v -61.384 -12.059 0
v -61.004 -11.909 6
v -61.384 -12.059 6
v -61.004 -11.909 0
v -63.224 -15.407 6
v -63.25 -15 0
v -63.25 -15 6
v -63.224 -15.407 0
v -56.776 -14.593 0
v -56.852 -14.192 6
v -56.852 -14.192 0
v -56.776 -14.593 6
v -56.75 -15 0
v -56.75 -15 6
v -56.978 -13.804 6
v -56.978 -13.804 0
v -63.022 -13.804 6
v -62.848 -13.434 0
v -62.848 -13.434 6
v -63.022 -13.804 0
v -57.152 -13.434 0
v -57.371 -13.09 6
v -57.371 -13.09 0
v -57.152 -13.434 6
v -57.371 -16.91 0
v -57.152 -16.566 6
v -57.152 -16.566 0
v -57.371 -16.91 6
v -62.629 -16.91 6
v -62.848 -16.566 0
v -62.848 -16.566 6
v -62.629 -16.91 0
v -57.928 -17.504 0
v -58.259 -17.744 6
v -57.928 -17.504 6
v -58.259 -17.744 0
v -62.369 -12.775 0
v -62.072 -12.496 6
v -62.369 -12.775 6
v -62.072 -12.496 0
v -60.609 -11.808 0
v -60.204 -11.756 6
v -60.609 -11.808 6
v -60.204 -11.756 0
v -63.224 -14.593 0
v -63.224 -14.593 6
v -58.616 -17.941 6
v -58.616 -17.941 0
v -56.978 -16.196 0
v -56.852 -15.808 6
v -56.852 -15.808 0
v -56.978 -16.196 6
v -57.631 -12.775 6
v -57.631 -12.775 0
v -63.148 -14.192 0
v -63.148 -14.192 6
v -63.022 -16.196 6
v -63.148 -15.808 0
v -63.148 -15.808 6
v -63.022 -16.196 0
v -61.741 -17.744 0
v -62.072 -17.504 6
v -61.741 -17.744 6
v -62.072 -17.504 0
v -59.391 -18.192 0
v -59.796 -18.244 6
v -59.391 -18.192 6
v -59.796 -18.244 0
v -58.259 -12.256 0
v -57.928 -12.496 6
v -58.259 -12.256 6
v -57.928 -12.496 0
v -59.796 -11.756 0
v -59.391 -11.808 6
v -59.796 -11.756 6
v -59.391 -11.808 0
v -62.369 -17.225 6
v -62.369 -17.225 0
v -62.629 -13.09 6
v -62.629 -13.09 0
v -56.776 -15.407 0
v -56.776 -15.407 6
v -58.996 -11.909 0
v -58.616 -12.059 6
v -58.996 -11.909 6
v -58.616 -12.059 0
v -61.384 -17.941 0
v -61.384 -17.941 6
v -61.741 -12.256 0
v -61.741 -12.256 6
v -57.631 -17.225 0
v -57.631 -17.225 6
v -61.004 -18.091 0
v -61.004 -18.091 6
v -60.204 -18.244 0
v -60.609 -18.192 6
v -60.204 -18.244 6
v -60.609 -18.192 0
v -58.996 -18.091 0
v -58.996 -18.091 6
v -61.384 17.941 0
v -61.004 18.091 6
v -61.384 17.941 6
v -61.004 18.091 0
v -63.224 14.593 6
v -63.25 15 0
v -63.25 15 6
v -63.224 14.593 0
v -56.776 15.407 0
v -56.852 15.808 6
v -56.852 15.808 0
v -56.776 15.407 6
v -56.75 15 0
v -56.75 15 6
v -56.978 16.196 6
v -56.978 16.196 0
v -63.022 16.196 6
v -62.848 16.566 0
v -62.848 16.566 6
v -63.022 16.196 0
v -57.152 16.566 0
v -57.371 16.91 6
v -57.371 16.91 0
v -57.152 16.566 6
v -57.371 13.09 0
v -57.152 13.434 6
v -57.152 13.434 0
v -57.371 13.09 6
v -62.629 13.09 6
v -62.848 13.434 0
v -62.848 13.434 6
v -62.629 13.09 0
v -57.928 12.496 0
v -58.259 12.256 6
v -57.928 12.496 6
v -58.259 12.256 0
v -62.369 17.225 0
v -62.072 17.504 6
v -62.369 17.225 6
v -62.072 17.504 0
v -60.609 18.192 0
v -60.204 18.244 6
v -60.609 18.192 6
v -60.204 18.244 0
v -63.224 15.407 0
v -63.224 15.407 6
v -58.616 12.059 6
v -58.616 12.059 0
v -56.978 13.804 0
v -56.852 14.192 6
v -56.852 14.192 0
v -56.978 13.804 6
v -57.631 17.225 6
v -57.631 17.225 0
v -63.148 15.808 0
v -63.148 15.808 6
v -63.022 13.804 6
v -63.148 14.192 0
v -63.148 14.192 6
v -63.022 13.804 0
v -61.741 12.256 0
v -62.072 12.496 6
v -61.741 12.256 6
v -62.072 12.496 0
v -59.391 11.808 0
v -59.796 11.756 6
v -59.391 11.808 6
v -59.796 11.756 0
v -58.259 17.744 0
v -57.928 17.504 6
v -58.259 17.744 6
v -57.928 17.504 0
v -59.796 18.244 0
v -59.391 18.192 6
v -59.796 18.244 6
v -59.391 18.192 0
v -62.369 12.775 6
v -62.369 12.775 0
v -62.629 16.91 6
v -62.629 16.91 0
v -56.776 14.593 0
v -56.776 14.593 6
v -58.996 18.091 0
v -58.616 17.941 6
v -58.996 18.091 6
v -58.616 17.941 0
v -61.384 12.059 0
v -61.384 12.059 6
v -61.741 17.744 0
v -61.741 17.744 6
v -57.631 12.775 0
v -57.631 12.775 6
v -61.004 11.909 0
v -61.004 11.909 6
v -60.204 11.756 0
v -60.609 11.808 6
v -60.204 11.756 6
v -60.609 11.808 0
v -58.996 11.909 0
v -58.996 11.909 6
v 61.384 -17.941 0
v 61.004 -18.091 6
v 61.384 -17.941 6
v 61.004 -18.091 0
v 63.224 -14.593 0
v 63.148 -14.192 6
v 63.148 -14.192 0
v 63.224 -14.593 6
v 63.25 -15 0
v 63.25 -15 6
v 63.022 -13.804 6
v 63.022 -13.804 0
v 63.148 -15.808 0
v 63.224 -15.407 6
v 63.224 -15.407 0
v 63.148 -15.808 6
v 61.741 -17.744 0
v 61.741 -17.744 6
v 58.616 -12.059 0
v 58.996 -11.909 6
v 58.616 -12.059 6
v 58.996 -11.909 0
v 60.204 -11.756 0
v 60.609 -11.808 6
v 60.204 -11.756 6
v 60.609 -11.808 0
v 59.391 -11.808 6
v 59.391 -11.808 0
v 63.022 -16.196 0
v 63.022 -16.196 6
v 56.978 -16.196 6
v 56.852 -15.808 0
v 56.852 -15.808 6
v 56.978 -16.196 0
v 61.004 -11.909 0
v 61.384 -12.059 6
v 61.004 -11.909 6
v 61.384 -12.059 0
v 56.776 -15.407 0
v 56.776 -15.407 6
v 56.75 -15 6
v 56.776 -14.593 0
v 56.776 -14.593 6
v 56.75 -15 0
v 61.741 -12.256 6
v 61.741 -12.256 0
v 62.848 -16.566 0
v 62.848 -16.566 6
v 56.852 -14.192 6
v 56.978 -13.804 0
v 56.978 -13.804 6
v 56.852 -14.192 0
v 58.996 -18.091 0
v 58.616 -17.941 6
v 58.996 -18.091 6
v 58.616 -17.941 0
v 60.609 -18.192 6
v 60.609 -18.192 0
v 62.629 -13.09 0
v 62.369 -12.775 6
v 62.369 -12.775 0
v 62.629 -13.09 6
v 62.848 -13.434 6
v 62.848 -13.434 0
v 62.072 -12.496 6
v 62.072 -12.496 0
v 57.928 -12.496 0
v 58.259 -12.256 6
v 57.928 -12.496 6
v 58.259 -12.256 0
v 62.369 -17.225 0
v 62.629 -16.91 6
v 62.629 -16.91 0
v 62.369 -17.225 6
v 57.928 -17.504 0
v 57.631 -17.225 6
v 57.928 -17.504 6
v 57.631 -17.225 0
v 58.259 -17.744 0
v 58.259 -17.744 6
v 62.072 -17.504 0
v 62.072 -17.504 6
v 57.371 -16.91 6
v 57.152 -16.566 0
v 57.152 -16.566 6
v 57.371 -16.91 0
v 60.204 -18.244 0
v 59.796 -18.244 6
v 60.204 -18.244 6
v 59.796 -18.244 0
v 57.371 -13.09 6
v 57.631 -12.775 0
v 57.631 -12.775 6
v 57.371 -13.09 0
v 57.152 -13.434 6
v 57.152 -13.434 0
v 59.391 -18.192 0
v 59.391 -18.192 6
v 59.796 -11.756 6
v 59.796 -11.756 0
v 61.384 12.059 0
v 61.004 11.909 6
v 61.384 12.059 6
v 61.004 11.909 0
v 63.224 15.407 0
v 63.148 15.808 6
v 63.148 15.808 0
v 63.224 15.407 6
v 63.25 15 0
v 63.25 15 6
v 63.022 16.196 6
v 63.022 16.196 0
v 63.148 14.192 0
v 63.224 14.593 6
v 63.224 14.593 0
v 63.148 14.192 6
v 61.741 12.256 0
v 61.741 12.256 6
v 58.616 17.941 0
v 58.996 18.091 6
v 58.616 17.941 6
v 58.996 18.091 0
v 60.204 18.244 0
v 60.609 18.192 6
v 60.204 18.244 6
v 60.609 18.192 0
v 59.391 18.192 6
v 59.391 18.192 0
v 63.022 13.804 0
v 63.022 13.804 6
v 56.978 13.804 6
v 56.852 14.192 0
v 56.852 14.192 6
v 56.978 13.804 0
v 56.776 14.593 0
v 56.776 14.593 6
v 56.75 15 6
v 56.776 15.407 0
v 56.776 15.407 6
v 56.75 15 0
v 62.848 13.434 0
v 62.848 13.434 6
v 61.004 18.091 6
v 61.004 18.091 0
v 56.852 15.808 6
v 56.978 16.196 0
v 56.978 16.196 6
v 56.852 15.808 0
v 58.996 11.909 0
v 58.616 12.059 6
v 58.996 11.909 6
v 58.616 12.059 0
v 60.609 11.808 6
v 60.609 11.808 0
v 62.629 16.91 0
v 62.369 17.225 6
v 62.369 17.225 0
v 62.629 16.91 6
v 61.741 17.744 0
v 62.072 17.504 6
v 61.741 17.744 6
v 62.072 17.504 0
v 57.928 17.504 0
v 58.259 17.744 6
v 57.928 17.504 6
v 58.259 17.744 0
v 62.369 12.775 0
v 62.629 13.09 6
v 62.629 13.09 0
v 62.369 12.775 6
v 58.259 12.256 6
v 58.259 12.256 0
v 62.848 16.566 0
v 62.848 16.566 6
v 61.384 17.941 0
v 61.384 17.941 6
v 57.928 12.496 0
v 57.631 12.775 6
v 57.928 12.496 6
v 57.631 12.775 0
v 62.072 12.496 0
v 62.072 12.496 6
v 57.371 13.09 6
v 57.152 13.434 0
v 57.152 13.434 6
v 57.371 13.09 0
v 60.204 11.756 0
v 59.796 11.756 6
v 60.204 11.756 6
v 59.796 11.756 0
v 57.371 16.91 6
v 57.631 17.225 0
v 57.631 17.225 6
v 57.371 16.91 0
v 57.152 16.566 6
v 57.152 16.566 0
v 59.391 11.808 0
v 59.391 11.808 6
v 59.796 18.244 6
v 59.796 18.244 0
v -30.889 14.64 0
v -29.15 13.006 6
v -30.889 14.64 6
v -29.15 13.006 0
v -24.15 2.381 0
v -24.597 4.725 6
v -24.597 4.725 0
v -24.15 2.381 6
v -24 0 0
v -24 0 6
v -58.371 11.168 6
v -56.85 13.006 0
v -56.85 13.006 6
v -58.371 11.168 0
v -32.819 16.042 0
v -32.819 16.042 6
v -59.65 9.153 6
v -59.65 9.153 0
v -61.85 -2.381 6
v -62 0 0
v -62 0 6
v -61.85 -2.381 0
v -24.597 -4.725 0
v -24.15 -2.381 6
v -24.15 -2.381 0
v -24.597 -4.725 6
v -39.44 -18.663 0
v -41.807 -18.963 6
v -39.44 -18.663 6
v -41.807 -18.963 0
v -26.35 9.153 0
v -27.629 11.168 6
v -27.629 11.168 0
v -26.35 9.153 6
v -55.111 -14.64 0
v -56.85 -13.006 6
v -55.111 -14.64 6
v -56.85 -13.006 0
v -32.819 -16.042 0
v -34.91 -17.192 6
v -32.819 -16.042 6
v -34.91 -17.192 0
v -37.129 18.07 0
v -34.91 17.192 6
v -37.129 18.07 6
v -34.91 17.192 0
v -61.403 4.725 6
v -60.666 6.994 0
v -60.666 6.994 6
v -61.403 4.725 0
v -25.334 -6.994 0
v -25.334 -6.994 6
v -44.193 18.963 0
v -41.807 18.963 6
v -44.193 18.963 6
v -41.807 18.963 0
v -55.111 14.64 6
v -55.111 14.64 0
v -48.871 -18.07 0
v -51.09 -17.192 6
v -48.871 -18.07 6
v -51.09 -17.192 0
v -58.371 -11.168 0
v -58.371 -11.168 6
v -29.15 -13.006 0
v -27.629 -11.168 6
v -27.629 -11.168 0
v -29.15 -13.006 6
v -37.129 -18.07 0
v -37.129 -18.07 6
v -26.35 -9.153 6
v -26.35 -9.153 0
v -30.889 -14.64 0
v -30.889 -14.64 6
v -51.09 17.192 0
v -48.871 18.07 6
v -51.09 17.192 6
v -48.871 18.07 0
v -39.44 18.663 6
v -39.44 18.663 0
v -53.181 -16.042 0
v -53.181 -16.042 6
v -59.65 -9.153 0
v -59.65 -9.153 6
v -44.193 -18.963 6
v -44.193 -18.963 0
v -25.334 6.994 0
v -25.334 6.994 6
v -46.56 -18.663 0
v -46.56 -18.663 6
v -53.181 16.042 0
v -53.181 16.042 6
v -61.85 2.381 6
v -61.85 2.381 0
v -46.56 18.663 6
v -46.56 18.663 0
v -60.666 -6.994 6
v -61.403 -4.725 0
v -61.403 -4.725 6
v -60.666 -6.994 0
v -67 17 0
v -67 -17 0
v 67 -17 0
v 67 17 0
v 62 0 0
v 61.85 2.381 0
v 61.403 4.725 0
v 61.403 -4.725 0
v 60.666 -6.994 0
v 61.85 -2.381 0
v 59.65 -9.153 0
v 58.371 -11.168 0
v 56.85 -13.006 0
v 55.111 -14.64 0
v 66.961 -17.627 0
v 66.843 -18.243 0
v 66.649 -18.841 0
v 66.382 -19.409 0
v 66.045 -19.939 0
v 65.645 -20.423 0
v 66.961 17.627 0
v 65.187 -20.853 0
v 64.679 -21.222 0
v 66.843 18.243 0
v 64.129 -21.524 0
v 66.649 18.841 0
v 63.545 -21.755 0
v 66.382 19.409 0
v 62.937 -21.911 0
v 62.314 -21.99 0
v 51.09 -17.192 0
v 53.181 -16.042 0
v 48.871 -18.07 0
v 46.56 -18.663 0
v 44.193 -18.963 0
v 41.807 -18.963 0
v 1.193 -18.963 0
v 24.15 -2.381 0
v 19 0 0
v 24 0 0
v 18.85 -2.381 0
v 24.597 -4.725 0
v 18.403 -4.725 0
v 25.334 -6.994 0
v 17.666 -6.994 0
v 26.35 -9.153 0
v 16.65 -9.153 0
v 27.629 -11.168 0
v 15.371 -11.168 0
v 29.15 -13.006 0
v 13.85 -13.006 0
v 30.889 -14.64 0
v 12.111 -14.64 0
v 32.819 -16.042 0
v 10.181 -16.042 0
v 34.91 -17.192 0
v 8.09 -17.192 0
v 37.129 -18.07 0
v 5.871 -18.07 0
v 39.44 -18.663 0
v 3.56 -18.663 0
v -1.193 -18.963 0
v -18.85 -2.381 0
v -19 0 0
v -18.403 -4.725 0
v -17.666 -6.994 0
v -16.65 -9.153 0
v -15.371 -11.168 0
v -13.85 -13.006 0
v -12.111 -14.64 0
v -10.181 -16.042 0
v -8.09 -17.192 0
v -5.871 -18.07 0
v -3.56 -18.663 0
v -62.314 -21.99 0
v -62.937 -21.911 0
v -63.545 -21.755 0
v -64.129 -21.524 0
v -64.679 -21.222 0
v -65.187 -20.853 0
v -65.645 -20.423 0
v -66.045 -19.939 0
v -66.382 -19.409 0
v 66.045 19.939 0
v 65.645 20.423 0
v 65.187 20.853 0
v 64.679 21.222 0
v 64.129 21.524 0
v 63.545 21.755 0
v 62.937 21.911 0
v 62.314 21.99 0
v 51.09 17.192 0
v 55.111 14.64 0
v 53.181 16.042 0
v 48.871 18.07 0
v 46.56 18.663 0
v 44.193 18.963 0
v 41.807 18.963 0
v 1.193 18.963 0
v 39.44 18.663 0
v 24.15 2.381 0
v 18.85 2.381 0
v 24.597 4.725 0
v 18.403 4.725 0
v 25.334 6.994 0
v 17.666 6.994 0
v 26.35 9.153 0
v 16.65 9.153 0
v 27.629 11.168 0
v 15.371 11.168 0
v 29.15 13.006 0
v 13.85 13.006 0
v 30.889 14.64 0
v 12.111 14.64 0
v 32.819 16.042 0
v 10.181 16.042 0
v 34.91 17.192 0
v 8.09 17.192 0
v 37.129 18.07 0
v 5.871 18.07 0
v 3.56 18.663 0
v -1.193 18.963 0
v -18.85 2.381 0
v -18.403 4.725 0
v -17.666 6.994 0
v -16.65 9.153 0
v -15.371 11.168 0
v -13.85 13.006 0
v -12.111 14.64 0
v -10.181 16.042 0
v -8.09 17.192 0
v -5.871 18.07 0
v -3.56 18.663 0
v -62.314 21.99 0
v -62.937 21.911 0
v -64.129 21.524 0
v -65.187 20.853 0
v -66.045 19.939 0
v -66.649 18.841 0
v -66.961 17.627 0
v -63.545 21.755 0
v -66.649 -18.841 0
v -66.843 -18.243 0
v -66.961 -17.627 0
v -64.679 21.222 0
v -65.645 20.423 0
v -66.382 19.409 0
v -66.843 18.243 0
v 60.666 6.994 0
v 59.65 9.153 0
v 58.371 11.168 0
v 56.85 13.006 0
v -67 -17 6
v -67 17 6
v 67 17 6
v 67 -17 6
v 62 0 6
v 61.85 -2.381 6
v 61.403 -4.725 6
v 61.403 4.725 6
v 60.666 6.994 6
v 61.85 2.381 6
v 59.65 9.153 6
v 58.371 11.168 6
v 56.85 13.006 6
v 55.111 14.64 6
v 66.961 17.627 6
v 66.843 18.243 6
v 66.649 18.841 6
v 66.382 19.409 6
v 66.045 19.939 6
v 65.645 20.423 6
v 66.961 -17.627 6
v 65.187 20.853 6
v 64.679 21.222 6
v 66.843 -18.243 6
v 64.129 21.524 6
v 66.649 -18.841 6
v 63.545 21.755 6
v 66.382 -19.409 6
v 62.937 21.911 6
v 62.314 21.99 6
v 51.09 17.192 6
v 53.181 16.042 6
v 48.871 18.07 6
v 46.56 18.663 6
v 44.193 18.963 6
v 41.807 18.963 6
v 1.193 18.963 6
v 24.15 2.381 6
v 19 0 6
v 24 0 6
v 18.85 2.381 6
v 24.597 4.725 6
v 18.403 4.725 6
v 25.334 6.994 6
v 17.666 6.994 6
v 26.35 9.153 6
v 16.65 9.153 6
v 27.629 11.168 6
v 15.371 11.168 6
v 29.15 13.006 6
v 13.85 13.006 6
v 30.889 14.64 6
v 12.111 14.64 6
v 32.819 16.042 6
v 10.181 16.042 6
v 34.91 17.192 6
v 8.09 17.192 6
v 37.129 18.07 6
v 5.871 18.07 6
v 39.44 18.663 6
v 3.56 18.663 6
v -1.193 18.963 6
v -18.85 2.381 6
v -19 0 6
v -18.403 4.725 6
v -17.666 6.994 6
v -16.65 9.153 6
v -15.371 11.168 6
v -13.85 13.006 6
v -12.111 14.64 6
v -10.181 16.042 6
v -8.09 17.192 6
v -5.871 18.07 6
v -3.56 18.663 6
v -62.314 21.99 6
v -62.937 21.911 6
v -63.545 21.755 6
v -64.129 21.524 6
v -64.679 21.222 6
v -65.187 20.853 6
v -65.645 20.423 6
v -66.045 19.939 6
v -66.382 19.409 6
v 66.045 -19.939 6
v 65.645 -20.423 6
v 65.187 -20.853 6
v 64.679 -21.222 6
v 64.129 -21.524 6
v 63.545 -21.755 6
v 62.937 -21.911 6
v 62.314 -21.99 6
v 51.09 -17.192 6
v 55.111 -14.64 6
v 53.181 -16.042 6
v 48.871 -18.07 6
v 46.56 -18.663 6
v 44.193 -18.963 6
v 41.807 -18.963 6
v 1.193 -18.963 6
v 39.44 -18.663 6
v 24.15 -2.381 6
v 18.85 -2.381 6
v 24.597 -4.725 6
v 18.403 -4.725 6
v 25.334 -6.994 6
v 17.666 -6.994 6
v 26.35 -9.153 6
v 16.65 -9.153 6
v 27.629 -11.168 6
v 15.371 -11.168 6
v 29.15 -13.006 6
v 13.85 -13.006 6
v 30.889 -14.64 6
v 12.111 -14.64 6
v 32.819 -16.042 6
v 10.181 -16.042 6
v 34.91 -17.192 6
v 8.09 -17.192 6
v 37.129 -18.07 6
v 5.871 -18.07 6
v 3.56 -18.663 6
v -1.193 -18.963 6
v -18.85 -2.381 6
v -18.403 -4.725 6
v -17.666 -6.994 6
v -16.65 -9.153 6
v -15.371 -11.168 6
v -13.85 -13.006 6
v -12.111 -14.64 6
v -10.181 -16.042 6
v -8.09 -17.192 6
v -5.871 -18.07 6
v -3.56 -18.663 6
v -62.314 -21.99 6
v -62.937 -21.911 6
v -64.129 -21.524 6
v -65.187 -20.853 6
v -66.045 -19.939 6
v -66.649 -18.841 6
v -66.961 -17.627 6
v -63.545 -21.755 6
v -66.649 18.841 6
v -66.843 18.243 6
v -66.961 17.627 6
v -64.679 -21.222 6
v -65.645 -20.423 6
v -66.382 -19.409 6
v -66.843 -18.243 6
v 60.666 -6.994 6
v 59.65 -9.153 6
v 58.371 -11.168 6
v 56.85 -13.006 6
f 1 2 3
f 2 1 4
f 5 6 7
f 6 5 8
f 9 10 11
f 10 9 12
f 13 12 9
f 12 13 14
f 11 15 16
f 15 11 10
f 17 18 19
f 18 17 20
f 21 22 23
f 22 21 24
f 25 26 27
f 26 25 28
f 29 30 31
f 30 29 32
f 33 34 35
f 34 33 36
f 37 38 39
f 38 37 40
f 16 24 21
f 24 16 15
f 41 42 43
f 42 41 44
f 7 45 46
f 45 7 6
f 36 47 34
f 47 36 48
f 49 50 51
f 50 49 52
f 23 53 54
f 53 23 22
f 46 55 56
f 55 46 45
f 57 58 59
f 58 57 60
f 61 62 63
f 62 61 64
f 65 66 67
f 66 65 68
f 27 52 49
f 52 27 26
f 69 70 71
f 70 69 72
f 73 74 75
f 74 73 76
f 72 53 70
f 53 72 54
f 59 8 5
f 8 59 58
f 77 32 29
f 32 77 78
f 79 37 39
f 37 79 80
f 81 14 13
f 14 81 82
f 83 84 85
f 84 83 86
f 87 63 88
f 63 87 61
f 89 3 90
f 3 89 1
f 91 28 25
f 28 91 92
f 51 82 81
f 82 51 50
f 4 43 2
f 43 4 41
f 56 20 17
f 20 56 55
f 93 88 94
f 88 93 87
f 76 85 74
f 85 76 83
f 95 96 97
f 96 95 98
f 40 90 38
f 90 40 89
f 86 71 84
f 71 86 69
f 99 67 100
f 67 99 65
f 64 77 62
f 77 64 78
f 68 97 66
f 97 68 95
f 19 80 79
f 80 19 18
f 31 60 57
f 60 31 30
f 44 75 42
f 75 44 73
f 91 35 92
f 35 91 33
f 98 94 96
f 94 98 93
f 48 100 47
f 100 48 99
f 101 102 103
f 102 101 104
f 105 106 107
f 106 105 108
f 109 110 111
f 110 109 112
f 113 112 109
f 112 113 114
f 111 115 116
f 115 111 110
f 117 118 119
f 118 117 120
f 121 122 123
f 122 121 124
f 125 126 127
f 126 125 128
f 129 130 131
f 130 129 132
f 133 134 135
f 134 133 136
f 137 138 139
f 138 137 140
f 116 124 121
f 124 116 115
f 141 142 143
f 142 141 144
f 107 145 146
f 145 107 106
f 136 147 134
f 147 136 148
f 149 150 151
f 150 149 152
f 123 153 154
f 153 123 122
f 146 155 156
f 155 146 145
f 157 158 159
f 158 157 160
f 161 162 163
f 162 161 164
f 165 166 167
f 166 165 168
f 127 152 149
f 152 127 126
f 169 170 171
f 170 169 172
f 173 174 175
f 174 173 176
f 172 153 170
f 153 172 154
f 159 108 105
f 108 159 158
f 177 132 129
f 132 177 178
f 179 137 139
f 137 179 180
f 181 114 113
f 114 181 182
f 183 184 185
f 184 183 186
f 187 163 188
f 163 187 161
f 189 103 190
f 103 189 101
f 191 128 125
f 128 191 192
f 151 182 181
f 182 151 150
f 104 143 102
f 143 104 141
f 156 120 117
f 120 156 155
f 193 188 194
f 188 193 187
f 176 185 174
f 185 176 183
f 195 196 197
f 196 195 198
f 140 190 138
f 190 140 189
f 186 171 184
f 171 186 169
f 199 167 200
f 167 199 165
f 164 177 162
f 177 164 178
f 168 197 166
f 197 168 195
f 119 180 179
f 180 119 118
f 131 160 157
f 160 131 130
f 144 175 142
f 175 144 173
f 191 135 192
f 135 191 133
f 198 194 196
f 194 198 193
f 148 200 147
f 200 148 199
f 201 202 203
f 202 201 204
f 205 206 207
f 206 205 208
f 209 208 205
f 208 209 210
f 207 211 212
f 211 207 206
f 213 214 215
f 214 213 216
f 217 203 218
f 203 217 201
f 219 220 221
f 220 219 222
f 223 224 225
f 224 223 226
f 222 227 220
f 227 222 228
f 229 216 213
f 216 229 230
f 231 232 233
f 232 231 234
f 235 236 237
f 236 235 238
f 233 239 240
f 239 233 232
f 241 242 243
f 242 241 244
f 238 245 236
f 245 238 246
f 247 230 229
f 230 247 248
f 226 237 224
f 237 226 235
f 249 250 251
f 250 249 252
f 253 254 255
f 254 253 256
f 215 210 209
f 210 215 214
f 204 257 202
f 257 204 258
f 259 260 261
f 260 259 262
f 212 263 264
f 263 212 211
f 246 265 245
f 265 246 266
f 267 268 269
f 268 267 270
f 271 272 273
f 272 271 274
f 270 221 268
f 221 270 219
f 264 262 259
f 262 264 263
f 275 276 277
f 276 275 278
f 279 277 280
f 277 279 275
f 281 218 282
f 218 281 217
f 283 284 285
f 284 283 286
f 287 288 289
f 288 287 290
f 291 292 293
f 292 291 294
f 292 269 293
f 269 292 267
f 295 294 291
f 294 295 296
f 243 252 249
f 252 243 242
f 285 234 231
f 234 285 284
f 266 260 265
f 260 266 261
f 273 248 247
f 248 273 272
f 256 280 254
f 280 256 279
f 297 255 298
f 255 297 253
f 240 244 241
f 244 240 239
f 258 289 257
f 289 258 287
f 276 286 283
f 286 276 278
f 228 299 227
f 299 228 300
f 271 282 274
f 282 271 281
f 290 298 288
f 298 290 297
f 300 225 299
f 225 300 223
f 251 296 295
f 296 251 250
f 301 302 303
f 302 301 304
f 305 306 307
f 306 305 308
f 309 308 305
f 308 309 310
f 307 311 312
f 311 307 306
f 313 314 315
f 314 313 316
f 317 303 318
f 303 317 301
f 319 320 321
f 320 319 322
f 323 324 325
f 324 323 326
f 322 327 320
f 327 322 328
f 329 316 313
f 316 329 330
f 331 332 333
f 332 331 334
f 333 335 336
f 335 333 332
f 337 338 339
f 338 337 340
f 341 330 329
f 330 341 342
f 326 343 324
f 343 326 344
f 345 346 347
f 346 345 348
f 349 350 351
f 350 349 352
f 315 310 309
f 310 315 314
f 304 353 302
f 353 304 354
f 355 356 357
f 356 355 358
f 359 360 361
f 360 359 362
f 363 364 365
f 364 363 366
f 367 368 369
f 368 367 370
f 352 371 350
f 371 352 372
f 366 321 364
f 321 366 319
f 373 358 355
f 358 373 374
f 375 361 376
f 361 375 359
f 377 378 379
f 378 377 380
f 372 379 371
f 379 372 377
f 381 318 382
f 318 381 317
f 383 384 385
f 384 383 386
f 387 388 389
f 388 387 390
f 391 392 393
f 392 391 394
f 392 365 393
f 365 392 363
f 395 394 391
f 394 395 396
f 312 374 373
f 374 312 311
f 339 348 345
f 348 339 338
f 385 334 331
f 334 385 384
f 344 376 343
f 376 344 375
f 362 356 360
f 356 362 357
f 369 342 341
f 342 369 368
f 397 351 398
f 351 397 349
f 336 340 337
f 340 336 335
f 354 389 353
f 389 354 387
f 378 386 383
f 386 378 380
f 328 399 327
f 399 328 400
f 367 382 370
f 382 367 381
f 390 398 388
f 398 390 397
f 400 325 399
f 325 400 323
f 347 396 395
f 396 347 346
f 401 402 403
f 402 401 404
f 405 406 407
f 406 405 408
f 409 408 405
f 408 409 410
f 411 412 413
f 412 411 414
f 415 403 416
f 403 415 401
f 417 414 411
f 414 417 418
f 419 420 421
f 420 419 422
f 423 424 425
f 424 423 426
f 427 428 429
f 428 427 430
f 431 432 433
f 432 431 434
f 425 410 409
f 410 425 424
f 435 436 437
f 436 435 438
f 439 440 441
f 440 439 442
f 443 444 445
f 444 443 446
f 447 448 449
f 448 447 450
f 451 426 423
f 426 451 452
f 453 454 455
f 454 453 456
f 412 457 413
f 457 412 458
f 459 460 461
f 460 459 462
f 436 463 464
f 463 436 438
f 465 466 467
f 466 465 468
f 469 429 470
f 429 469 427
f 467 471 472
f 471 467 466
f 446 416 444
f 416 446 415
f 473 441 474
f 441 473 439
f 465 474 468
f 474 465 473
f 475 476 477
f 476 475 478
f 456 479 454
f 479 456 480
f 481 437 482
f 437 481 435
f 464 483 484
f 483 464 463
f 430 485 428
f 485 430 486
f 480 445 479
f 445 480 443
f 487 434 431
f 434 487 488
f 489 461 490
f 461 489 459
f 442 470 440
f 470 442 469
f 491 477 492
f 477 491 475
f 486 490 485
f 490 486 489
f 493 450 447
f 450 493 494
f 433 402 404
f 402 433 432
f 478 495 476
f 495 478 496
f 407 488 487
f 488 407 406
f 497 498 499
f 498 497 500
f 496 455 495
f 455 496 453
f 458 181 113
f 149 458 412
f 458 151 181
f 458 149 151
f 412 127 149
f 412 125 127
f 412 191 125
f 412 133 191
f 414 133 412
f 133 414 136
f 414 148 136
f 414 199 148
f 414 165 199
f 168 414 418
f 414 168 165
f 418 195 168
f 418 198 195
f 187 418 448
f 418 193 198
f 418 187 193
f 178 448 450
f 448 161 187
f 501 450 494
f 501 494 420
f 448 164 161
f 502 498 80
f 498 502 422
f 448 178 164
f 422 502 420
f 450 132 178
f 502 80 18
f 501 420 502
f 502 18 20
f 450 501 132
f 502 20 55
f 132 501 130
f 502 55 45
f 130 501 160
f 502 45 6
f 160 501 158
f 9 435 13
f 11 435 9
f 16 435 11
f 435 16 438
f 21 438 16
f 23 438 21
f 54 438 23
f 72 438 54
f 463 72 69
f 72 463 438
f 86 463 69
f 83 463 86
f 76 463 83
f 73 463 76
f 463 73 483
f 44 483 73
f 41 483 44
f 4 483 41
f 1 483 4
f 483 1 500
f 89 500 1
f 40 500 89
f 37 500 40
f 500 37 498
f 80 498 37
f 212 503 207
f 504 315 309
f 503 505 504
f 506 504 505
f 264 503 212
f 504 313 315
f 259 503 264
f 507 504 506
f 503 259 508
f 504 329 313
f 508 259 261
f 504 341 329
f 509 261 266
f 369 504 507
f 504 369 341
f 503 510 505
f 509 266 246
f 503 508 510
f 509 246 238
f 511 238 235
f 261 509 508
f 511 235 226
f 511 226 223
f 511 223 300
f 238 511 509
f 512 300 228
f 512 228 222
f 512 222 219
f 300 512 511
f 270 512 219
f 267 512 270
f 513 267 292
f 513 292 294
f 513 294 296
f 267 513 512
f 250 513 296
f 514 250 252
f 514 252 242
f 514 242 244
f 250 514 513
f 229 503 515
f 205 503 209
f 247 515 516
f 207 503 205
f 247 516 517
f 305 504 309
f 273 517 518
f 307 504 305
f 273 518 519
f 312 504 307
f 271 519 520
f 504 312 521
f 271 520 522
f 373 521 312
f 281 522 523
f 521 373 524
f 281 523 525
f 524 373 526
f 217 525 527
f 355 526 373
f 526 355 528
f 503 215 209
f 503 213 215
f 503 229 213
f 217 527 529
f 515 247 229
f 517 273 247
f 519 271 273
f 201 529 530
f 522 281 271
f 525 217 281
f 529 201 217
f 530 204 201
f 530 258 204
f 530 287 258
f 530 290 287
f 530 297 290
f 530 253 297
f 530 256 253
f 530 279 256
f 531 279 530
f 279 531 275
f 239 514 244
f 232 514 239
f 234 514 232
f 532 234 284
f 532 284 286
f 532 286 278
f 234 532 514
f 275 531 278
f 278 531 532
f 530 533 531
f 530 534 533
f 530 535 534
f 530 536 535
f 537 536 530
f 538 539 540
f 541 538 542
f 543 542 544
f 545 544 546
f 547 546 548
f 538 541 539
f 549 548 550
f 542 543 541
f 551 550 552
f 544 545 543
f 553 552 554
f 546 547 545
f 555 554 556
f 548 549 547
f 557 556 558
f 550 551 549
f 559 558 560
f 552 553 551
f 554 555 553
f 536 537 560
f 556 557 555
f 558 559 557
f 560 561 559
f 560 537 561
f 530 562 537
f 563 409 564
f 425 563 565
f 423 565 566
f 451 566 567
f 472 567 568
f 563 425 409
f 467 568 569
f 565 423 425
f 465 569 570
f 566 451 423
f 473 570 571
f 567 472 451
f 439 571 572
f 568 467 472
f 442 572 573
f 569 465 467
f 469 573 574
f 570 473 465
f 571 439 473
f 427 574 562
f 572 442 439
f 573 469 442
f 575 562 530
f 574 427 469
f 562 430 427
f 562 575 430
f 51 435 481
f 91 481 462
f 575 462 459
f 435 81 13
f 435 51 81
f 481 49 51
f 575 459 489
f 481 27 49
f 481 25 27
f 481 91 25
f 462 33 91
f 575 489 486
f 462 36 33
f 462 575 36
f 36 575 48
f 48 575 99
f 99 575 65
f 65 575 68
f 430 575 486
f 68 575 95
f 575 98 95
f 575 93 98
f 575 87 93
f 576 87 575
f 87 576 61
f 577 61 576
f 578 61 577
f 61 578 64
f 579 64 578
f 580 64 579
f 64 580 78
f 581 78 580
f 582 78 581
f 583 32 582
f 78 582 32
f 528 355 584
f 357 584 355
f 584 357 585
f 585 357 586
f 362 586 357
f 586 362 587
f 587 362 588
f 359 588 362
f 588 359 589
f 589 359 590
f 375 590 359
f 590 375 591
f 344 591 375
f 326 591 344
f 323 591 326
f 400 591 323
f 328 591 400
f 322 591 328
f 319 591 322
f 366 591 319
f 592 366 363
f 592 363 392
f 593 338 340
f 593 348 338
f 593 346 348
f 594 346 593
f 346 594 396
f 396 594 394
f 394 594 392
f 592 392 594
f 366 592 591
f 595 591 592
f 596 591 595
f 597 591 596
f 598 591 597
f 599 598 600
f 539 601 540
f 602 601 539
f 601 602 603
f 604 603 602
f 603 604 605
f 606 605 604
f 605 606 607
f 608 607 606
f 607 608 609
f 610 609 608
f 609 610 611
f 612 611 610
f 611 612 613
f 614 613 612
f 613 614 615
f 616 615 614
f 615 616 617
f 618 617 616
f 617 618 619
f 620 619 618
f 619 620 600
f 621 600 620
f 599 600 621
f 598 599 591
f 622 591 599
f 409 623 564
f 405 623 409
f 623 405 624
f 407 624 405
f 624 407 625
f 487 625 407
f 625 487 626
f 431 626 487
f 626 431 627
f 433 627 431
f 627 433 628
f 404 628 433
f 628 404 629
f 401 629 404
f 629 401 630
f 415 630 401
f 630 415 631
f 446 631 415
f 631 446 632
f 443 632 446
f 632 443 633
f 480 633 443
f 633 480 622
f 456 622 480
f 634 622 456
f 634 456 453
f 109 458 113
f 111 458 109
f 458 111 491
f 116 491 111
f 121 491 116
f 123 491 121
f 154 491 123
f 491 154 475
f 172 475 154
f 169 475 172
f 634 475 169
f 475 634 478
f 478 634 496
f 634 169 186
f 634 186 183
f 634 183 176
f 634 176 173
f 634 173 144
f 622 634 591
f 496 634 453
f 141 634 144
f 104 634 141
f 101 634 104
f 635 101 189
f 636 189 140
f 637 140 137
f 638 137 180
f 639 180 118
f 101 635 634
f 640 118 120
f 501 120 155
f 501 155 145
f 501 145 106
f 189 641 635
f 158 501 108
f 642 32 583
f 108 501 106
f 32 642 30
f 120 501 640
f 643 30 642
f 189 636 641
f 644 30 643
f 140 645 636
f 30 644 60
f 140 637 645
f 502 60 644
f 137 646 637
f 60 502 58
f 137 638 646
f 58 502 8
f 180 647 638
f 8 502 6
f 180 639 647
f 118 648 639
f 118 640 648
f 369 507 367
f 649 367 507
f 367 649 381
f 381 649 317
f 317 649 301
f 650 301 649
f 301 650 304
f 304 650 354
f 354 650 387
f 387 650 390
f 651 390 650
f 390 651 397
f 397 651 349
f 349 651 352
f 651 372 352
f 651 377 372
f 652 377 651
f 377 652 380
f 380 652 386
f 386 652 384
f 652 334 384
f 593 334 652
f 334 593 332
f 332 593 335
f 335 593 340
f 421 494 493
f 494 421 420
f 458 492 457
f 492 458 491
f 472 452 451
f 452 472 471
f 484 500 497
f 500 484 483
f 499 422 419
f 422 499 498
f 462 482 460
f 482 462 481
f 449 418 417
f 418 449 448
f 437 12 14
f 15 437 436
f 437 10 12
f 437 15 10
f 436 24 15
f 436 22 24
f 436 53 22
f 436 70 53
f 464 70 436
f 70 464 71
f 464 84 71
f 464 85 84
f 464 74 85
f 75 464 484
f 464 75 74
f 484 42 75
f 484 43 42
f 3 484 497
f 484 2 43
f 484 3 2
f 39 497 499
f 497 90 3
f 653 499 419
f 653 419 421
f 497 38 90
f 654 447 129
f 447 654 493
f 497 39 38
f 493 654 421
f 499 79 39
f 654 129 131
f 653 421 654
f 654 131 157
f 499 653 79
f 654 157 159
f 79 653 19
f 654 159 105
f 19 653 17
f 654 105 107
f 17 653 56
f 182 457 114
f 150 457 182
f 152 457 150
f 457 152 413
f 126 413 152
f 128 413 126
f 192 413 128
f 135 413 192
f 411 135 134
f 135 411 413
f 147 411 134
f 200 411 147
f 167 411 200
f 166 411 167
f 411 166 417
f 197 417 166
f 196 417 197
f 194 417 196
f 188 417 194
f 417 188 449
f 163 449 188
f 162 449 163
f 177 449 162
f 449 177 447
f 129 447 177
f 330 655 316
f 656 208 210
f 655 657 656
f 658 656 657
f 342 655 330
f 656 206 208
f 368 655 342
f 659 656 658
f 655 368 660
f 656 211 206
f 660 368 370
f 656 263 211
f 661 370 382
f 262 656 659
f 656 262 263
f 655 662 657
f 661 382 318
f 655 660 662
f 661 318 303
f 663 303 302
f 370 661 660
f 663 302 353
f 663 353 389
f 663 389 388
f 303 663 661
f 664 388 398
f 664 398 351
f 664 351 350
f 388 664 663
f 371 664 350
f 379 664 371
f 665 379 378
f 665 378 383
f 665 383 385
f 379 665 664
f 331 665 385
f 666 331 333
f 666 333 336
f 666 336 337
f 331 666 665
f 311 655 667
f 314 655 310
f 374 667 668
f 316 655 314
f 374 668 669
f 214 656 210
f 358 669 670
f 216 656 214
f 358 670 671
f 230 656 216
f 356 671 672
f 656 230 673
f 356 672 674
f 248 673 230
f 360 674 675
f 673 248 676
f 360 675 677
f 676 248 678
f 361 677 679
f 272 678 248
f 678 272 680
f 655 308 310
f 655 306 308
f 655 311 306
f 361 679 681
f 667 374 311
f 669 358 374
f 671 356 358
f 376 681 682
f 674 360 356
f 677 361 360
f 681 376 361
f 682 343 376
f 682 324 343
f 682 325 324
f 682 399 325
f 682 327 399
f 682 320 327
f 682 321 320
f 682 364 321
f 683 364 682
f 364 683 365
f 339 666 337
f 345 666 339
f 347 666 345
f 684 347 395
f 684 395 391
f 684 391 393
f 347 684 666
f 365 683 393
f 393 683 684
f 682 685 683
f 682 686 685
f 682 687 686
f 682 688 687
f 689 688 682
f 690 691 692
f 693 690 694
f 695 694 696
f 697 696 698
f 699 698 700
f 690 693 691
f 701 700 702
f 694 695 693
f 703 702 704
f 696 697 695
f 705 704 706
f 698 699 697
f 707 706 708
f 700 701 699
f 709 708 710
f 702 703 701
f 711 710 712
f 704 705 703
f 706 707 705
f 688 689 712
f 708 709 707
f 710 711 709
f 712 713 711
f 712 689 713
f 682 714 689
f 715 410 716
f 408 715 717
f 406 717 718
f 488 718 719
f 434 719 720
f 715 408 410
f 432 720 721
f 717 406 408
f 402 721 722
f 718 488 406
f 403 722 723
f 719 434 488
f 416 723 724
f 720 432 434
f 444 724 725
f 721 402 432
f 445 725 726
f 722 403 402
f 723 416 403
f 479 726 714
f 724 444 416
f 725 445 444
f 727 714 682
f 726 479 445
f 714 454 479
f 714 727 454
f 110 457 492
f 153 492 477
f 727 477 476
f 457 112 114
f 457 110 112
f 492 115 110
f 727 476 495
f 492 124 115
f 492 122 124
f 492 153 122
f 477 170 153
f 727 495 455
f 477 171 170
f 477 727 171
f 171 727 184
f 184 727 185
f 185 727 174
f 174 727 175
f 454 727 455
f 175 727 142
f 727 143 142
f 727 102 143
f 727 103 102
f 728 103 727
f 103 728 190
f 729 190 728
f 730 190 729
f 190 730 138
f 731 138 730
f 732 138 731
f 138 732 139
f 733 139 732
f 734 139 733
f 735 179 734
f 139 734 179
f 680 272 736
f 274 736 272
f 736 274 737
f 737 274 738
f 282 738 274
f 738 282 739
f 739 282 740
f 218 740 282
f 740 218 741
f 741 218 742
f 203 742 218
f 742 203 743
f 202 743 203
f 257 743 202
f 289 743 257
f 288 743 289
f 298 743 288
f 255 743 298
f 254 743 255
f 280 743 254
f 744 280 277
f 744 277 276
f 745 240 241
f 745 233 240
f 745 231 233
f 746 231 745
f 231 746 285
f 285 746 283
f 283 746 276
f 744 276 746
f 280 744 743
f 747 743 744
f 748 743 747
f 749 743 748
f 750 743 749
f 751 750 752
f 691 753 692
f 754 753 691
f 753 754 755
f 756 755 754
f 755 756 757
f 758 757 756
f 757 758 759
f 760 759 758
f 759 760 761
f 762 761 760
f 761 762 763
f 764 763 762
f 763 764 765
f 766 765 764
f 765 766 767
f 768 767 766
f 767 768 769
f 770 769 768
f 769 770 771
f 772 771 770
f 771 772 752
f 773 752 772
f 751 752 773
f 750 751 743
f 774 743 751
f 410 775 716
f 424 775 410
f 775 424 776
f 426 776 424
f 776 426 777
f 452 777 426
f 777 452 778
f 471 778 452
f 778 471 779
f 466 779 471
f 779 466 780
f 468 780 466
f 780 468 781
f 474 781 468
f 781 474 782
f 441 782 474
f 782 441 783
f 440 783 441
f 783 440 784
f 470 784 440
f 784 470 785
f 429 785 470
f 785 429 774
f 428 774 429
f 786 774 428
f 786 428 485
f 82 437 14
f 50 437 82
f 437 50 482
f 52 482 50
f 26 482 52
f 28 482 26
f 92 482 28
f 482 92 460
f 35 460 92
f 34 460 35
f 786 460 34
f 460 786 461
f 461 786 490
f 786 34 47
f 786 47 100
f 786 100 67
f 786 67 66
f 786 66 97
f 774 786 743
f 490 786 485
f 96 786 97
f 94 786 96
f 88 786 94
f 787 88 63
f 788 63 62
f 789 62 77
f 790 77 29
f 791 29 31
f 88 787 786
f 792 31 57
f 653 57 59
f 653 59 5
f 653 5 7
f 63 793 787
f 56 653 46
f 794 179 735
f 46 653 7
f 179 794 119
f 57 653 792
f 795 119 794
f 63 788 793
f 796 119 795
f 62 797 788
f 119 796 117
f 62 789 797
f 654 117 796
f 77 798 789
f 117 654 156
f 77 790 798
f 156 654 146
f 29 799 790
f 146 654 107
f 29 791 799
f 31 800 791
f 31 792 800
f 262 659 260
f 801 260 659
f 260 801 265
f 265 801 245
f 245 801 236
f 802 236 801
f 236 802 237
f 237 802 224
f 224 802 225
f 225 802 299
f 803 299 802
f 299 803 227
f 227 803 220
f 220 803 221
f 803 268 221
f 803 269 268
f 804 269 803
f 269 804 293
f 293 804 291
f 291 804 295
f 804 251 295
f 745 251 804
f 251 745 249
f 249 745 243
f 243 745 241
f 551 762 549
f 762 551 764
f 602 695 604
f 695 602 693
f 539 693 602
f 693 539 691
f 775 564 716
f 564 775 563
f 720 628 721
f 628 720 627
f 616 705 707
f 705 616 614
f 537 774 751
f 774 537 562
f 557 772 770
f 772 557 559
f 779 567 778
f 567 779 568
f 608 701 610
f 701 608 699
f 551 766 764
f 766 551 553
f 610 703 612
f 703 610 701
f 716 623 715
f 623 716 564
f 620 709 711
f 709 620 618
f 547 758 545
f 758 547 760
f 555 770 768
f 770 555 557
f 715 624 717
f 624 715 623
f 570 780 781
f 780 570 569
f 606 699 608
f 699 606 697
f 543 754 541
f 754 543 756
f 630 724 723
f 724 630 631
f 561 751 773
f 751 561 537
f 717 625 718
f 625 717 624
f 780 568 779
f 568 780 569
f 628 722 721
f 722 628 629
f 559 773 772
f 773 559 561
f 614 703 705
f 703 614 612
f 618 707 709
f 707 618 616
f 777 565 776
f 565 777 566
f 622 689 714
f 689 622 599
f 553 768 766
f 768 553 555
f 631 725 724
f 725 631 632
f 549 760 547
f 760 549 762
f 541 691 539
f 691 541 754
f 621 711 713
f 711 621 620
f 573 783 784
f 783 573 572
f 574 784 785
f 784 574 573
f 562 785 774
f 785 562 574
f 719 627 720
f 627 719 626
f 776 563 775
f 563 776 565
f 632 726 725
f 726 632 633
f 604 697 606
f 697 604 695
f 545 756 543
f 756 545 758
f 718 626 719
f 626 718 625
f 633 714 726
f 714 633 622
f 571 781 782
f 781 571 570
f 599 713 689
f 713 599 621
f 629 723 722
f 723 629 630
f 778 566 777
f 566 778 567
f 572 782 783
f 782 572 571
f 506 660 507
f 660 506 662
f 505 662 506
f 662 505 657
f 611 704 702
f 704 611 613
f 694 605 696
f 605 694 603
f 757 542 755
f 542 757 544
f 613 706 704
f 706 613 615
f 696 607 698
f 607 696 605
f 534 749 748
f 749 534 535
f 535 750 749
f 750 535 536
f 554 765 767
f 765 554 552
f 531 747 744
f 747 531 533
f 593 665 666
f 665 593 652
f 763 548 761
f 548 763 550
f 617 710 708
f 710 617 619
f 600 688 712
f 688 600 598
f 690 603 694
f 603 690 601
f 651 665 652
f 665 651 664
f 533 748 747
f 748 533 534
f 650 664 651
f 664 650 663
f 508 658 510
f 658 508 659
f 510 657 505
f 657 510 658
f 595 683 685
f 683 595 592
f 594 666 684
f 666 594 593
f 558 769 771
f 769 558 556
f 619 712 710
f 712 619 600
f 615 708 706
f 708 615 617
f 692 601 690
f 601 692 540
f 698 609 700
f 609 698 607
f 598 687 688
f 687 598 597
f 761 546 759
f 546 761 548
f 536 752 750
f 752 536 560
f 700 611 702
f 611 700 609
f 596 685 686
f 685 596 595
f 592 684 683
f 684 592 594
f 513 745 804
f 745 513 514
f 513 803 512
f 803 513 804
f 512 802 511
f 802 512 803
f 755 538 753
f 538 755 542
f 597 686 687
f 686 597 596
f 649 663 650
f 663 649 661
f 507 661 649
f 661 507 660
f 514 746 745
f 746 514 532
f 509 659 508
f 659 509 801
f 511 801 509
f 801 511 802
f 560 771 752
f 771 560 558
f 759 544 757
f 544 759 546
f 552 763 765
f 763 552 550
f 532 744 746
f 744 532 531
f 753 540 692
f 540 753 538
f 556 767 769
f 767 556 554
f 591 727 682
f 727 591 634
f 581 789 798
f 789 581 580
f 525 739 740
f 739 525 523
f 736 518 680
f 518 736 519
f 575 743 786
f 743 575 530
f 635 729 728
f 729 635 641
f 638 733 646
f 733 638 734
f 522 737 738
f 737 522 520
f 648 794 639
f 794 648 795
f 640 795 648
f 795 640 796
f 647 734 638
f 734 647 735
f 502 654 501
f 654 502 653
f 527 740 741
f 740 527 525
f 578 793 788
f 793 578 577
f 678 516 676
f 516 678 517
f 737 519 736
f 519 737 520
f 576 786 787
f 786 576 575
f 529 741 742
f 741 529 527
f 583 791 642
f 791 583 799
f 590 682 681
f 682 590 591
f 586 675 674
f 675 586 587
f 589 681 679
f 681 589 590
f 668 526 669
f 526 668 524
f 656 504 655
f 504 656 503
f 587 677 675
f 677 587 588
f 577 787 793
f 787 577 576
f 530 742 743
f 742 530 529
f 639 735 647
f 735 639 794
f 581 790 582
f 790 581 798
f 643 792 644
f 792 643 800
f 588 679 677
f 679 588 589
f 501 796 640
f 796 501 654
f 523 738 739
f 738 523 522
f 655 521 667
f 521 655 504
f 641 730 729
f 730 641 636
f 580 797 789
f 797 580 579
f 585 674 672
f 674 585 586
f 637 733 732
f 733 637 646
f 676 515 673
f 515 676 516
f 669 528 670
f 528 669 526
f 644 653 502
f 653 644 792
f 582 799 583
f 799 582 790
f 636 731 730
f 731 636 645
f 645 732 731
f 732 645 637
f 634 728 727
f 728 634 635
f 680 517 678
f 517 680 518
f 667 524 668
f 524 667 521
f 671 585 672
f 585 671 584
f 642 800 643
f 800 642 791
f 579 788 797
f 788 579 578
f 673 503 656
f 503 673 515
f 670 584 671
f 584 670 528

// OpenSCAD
$fn = 50;

difference() {
	union() {
		hull() {
			translate(v = [-62.0, 17.0, 0]) {
				cylinder(h = 6, r = 5);
			}
			translate(v = [62.0, 17.0, 0]) {
				cylinder(h = 6, r = 5);
			}
			translate(v = [-62.0, -17.0, 0]) {
				cylinder(h = 6, r = 5);
			}
			translate(v = [62.0, -17.0, 0]) {
				cylinder(h = 6, r = 5);
			}
		}
	}
	union() {
		translate(v = [-60.0, -15.0, -100.0]) {
			cylinder(h = 200, r = 3.25);
		}
		translate(v = [-60.0, 15.0, -100.0]) {
			cylinder(h = 200, r = 3.25);
		}
		translate(v = [60.0, -15.0, -100.0]) {
			cylinder(h = 200, r = 3.25);
		}
		translate(v = [60.0, 15.0, -100.0]) {
			cylinder(h = 200, r = 3.25);
		}
		translate(v = [-60.0, -15.0, -100.0]) {
			cylinder(h = 200, r = 1.8);
		}
		translate(v = [-60.0, 15.0, -100.0]) {
			cylinder(h = 200, r = 1.8);
		}
		translate(v = [60.0, -15.0, -100.0]) {
			cylinder(h = 200, r = 1.8);
		}
		translate(v = [60.0, 15.0, -100.0]) {
			cylinder(h = 200, r = 1.8);
		}
		translate(v = [-43.0, 0, 0.0]) {
			cylinder(h = 6, r = 19.0);
		}
		cylinder(h = 6, r = 19.0);
		translate(v = [43.0, 0, 0.0]) {
			cylinder(h = 6, r = 19.0);
		}
	}
}
